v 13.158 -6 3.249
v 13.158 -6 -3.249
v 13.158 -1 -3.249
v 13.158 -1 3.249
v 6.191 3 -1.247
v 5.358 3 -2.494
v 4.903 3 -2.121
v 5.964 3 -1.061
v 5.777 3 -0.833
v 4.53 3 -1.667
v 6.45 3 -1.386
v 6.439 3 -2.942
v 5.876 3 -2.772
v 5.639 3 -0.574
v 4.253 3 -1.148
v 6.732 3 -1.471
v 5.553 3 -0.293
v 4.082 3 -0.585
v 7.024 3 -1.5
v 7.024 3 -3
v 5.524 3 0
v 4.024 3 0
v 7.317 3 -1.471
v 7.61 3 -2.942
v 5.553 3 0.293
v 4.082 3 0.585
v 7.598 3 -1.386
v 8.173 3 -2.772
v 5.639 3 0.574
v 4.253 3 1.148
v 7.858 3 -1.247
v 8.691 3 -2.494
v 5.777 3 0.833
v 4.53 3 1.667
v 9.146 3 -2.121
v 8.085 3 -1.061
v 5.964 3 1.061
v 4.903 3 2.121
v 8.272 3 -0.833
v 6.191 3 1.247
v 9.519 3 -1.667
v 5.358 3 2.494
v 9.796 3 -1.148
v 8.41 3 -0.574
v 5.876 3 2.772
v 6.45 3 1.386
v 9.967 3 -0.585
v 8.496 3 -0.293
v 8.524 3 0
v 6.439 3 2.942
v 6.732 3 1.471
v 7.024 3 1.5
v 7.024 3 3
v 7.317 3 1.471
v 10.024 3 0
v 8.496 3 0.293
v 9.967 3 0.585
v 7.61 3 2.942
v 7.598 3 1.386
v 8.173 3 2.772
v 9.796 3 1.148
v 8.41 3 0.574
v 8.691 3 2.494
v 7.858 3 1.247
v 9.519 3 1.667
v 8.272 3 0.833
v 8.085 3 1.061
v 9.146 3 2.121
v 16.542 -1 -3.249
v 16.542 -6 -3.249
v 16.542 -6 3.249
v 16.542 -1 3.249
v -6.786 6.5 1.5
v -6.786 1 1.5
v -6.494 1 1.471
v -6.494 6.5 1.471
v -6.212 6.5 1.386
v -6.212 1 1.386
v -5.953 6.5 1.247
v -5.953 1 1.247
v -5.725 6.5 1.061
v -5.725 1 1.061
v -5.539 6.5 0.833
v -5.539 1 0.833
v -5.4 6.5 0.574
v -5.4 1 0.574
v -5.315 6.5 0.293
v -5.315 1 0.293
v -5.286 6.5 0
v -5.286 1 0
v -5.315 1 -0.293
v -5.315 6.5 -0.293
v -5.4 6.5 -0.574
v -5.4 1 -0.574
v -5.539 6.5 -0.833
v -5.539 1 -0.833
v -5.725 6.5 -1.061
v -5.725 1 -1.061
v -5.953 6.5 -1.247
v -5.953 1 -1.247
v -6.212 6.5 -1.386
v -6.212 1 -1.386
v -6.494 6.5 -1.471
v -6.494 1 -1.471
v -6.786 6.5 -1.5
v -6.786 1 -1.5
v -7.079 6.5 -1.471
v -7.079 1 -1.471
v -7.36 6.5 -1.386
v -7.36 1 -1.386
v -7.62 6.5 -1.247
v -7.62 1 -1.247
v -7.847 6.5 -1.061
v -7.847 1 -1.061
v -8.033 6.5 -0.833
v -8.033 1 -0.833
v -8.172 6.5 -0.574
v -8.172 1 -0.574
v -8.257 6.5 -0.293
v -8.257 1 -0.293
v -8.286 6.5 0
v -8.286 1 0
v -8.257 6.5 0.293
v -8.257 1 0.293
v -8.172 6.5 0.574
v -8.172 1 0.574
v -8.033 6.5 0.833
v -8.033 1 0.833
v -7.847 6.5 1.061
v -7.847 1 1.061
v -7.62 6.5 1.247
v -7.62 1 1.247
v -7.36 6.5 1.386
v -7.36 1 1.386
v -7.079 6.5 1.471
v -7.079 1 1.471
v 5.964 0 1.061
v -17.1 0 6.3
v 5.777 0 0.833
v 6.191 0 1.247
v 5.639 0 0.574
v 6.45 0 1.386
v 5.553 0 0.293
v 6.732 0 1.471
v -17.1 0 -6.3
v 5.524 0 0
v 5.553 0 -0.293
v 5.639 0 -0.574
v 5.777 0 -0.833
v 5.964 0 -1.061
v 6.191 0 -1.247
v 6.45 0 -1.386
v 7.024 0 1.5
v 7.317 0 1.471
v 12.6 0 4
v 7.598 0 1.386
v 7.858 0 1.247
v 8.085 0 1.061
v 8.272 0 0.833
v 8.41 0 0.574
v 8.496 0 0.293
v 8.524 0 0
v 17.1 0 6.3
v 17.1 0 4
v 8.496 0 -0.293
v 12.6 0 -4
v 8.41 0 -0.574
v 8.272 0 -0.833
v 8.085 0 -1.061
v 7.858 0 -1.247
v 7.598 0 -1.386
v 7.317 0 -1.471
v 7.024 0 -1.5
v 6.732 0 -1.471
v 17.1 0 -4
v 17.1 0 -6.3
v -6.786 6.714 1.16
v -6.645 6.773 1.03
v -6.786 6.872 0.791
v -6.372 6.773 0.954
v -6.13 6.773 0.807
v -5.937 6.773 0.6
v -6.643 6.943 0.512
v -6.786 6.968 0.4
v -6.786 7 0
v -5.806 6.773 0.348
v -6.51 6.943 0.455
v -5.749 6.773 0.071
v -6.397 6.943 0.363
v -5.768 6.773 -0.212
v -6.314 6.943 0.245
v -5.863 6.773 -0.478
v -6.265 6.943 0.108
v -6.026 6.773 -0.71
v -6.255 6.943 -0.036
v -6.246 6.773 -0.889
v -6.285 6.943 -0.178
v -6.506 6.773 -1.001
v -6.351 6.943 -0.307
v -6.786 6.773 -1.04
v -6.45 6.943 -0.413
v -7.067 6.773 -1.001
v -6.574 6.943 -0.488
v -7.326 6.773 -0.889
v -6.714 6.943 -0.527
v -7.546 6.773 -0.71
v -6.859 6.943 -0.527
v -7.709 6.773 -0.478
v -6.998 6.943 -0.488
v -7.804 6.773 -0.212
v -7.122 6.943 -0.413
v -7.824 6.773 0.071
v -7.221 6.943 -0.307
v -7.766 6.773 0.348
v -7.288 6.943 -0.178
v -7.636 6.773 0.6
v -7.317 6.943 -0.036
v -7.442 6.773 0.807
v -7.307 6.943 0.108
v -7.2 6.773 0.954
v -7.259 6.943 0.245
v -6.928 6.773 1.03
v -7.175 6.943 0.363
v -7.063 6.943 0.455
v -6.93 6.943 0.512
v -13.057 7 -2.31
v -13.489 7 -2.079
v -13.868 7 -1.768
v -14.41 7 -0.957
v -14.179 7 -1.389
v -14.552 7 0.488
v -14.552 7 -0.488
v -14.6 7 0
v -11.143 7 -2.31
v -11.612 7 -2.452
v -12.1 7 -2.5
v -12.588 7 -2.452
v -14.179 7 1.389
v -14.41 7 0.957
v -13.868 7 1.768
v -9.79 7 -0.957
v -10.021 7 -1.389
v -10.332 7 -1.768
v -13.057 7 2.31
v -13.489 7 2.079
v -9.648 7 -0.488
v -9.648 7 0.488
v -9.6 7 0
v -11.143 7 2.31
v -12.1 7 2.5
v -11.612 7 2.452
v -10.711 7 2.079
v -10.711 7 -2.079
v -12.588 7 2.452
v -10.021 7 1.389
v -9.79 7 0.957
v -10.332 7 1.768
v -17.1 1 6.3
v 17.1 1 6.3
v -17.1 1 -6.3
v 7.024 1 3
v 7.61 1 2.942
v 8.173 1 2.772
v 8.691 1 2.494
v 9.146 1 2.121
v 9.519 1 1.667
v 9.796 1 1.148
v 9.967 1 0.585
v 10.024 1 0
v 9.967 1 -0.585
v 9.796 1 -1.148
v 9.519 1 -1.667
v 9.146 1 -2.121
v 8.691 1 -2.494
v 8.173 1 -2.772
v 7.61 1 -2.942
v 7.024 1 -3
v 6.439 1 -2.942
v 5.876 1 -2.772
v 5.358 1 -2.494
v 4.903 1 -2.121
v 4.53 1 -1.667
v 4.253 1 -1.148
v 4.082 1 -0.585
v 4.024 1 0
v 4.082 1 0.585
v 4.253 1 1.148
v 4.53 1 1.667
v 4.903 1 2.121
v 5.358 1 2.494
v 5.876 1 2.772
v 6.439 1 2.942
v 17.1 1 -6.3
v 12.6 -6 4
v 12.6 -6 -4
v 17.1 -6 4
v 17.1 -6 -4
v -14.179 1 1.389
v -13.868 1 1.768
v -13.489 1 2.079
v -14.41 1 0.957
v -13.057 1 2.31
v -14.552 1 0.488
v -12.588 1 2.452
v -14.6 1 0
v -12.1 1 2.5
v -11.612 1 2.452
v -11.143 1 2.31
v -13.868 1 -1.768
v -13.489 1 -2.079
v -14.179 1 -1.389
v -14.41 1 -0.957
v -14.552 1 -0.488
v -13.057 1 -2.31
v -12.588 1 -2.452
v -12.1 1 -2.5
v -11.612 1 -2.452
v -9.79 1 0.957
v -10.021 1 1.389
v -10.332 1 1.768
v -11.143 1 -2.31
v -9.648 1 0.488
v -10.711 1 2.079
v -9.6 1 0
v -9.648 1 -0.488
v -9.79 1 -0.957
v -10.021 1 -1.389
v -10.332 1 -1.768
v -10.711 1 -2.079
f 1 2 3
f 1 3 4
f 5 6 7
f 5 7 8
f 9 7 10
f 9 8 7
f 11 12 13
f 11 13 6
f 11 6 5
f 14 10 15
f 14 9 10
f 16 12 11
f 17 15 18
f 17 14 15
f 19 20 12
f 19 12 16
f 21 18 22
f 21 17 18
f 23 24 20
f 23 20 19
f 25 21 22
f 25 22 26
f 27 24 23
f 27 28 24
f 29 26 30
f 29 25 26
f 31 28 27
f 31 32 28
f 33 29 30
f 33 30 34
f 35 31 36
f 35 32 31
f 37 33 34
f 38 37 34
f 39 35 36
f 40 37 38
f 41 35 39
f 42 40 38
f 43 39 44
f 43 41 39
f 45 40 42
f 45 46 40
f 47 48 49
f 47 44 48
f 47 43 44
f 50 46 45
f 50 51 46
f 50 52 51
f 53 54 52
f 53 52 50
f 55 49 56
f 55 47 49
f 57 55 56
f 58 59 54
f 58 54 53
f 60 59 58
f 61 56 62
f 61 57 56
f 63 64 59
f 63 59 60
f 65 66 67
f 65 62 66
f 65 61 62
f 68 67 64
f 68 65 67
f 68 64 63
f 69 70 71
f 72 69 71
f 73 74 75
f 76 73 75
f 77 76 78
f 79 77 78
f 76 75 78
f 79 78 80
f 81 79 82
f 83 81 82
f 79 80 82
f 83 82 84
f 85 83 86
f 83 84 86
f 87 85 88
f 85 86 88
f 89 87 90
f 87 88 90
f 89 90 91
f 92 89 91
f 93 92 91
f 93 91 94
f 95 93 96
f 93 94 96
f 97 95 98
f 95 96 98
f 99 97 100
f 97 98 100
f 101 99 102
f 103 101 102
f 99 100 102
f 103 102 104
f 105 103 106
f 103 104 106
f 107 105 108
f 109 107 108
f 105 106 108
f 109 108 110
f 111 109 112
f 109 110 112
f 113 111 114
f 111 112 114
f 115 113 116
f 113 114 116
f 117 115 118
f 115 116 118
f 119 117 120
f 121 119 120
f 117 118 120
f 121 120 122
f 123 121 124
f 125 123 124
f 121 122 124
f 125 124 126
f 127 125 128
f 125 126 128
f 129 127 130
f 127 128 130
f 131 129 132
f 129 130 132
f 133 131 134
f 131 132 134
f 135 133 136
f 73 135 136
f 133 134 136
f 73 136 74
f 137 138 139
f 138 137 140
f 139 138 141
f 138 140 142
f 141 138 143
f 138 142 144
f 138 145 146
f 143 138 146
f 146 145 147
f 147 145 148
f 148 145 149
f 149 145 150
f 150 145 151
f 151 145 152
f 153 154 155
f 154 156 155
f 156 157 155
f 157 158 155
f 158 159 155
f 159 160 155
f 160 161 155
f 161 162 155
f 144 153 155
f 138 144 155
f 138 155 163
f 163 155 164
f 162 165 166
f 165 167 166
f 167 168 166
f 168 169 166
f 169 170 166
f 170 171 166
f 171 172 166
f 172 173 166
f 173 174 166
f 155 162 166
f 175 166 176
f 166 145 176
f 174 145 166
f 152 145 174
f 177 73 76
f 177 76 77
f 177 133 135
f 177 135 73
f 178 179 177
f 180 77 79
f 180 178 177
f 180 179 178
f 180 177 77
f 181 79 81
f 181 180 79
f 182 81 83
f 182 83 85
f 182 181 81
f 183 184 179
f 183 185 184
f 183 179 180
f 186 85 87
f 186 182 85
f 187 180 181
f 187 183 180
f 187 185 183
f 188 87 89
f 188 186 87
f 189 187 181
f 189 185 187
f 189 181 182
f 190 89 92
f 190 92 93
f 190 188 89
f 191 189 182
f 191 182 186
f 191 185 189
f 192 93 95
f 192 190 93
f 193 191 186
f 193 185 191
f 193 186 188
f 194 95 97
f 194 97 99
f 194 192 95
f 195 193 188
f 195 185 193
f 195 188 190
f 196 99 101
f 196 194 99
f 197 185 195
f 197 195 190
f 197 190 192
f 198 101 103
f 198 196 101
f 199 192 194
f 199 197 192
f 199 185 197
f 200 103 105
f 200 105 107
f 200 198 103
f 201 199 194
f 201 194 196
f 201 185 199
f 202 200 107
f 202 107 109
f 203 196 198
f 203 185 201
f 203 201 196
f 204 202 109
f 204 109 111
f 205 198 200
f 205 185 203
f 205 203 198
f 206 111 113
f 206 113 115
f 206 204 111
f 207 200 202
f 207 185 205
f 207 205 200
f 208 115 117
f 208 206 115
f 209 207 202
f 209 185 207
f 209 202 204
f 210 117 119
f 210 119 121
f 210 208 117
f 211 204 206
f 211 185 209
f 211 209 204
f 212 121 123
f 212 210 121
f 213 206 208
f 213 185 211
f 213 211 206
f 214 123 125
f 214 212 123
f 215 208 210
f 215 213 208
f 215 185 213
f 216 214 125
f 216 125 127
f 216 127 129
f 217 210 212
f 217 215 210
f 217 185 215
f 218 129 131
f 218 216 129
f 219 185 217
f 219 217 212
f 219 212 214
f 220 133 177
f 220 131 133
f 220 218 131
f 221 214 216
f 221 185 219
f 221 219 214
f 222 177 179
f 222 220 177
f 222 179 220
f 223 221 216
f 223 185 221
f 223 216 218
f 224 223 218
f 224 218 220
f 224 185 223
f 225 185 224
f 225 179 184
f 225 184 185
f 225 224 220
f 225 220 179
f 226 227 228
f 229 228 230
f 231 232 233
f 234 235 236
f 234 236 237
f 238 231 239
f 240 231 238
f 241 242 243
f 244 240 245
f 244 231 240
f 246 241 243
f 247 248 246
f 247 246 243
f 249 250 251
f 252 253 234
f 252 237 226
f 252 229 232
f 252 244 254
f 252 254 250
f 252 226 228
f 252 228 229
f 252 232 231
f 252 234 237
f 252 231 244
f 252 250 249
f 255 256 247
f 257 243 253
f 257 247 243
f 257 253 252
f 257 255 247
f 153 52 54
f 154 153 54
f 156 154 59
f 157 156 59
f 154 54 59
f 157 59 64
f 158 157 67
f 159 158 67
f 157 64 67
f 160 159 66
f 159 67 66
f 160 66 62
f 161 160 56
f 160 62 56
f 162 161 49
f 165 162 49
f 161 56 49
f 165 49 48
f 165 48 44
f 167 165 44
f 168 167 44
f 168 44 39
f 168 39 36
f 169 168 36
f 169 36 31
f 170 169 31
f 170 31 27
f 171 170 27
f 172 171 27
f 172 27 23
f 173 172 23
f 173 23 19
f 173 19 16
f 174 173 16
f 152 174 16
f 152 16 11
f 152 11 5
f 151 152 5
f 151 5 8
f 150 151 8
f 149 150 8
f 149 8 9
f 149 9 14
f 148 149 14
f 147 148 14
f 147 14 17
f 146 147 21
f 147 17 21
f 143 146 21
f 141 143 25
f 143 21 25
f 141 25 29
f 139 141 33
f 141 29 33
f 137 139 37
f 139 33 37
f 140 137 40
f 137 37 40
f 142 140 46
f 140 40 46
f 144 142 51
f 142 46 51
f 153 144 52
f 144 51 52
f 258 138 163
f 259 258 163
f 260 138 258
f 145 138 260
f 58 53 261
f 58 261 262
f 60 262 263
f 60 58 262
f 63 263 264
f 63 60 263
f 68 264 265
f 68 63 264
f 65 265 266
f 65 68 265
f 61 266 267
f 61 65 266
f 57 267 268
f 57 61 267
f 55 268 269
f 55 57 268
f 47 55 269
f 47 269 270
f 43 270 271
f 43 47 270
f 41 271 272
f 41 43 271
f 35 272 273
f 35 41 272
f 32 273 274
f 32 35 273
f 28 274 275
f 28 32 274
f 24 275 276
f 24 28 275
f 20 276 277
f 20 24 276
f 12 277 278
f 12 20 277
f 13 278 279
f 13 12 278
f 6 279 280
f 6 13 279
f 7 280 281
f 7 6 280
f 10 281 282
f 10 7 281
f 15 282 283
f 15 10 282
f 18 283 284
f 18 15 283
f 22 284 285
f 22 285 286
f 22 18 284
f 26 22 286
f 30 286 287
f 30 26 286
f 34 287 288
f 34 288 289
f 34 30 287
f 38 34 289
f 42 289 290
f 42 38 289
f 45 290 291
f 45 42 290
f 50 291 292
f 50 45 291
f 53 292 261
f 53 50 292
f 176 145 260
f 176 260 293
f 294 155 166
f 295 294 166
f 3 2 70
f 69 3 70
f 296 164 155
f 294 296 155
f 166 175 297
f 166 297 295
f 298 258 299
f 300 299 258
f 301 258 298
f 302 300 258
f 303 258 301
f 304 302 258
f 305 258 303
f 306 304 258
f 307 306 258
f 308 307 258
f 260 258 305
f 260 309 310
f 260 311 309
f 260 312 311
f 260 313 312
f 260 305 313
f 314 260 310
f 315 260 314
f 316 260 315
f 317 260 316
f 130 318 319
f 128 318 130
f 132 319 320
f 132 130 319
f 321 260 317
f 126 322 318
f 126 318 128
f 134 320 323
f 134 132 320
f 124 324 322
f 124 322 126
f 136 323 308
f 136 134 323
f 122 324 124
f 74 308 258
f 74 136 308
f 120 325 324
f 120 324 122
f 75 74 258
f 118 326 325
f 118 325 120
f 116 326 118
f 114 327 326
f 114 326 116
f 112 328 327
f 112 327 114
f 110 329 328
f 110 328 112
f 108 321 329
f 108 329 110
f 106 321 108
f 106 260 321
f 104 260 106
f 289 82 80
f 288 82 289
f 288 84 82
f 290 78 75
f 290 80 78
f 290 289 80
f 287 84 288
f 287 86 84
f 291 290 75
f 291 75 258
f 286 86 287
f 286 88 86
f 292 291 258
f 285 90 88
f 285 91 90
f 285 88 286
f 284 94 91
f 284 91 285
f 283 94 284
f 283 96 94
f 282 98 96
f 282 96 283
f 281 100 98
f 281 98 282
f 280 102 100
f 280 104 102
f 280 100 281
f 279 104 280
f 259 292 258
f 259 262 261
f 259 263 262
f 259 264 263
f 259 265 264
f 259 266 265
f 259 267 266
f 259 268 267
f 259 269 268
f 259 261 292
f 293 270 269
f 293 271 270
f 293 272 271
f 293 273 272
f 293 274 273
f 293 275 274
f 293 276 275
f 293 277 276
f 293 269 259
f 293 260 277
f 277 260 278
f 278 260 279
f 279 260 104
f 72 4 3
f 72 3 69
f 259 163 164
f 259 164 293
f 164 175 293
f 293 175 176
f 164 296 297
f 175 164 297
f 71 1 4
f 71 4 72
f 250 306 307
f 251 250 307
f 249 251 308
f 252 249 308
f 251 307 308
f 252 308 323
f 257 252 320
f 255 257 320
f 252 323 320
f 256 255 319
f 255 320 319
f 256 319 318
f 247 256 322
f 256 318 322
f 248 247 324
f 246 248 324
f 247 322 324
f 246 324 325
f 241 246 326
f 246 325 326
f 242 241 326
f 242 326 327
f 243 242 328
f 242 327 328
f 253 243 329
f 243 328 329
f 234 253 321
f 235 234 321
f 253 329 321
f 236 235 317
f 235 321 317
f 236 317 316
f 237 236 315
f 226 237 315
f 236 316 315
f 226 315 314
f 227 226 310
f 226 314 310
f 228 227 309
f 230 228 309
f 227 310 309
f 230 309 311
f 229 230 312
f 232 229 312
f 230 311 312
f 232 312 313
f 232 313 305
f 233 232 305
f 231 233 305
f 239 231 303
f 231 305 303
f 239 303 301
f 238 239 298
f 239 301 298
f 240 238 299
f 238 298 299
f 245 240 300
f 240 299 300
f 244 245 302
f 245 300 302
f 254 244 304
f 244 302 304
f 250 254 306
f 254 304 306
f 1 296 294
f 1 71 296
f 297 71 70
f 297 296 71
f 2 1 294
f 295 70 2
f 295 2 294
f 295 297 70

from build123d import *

# Parameters (mm, degrees)
SKETCH_1_W          = 34.2
SKETCH_1_H          = 12.6
EXTRUDE_1_DEPTH     = 1
SKETCH_2_R          = 2.5
EXTRUDE_2_DEPTH     = 6
SKETCH_3_R          = 1.5
EXTRUDE_3_DEPTH     = 5.5
DOME_3_FACE_RADIUS  = 1.5
DOME_3_HEIGHT       = 0.5
SKETCH_4_R          = 1.5
CUT_EXTRUDE_1_DEPTH = 20.185932346
EXTRUDE_START       = 2
SKETCH_5_R          = 3
SKETCH_5_R_2        = 1.5
EXTRUDE_4_DEPTH     = 2
SKETCH_6_W          = 4.5
SKETCH_6_H          = 8
EXTRUDE_6_DEPTH     = 6
SKETCH_7_W          = 3.38323666
SKETCH_7_H          = 6.498483094
CUT_EXTRUDE_2_DEPTH = 5


with BuildPart() as part:
    # 草图1 → 凸台-拉伸1 (new body)
    with BuildSketch(Plane(origin=(0, 0, 0), x_dir=(1, 0, 0), z_dir=(0, 1, 0))):
        Rectangle(SKETCH_1_W, SKETCH_1_H)
    extrude(amount=EXTRUDE_1_DEPTH)

    # 草图2 → 凸台-拉伸2 (add)
    with BuildSketch(Plane(origin=(0, 1, 0), x_dir=(1, 0, 0), z_dir=(0, 1, 0))):
        with Locations(Location((-12.1, 0, 0), (0, 0, 270))):
            Circle(SKETCH_2_R)
    extrude(amount=EXTRUDE_2_DEPTH)

    # 草图3 → 凸台-拉伸3 (add)
    with BuildSketch(Plane(origin=(0, 1, 0), x_dir=(1, 0, 0), z_dir=(0, 1, 0))):
        with Locations(Location((-6.786156124, 0, 0), (0, 0, 270))):
            Circle(SKETCH_3_R)
    extrude(amount=EXTRUDE_3_DEPTH)

    # 圆顶3: a dome of height H over a round flat face of radius A is a cap of a sphere of radius (A * A + H * H) / (2 * H)
    dome_3_r = (DOME_3_FACE_RADIUS * DOME_3_FACE_RADIUS + DOME_3_HEIGHT * DOME_3_HEIGHT) / (2 * DOME_3_HEIGHT)
    dome_3_base = Plane((-6.786156124, 6.5, 0), z_dir=(0, 1, 0))
    with Locations(dome_3_base.offset(DOME_3_HEIGHT - dome_3_r)):
        dome_3_ball = Sphere(dome_3_r, mode=Mode.PRIVATE)
    add(split(dome_3_ball, bisect_by=dome_3_base, keep=Keep.TOP, mode=Mode.PRIVATE))

    # 草图4 → 切除-拉伸1 (cut, through all)
    with BuildSketch(Plane(origin=(0, 1, 0), x_dir=(1, 0, 0), z_dir=(0, 1, 0))):
        with Locations(Location((7.02445794, 0, 0), (0, 0, 270))):
            Circle(SKETCH_4_R)
    extrude(amount=-CUT_EXTRUDE_1_DEPTH, mode=Mode.SUBTRACT)

    # 草图5 → 凸台-拉伸4 (add)
    with BuildSketch(Plane(origin=(0, 1, 0), x_dir=(1, 0, 0), z_dir=(0, 1, 0)).offset(EXTRUDE_START)):
        with Locations(Location((7.02445794, 0, 0), (0, 0, 270))):
            Circle(SKETCH_5_R)
        with Locations(Location((7.02445794, 0, 0), (0, 0, 270))):
            Circle(SKETCH_5_R_2, mode=Mode.SUBTRACT)
    extrude(amount=-EXTRUDE_4_DEPTH)

    # 草图6 → 凸台-拉伸6 (add)
    with BuildSketch(Plane(origin=(0, 0, 0), x_dir=(-1, 0, 0), z_dir=(0, -1, 0))):
        with Locations((-14.85, 0)):
            Rectangle(SKETCH_6_W, SKETCH_6_H)
    extrude(amount=EXTRUDE_6_DEPTH)

    # 草图7 → 切除-拉伸2 (cut)
    with BuildSketch(Plane.XZ.offset(6)):
        with Locations((14.85, 0)):
            Rectangle(SKETCH_7_W, SKETCH_7_H)
    extrude(amount=-CUT_EXTRUDE_2_DEPTH, mode=Mode.SUBTRACT)


solid = part.part
